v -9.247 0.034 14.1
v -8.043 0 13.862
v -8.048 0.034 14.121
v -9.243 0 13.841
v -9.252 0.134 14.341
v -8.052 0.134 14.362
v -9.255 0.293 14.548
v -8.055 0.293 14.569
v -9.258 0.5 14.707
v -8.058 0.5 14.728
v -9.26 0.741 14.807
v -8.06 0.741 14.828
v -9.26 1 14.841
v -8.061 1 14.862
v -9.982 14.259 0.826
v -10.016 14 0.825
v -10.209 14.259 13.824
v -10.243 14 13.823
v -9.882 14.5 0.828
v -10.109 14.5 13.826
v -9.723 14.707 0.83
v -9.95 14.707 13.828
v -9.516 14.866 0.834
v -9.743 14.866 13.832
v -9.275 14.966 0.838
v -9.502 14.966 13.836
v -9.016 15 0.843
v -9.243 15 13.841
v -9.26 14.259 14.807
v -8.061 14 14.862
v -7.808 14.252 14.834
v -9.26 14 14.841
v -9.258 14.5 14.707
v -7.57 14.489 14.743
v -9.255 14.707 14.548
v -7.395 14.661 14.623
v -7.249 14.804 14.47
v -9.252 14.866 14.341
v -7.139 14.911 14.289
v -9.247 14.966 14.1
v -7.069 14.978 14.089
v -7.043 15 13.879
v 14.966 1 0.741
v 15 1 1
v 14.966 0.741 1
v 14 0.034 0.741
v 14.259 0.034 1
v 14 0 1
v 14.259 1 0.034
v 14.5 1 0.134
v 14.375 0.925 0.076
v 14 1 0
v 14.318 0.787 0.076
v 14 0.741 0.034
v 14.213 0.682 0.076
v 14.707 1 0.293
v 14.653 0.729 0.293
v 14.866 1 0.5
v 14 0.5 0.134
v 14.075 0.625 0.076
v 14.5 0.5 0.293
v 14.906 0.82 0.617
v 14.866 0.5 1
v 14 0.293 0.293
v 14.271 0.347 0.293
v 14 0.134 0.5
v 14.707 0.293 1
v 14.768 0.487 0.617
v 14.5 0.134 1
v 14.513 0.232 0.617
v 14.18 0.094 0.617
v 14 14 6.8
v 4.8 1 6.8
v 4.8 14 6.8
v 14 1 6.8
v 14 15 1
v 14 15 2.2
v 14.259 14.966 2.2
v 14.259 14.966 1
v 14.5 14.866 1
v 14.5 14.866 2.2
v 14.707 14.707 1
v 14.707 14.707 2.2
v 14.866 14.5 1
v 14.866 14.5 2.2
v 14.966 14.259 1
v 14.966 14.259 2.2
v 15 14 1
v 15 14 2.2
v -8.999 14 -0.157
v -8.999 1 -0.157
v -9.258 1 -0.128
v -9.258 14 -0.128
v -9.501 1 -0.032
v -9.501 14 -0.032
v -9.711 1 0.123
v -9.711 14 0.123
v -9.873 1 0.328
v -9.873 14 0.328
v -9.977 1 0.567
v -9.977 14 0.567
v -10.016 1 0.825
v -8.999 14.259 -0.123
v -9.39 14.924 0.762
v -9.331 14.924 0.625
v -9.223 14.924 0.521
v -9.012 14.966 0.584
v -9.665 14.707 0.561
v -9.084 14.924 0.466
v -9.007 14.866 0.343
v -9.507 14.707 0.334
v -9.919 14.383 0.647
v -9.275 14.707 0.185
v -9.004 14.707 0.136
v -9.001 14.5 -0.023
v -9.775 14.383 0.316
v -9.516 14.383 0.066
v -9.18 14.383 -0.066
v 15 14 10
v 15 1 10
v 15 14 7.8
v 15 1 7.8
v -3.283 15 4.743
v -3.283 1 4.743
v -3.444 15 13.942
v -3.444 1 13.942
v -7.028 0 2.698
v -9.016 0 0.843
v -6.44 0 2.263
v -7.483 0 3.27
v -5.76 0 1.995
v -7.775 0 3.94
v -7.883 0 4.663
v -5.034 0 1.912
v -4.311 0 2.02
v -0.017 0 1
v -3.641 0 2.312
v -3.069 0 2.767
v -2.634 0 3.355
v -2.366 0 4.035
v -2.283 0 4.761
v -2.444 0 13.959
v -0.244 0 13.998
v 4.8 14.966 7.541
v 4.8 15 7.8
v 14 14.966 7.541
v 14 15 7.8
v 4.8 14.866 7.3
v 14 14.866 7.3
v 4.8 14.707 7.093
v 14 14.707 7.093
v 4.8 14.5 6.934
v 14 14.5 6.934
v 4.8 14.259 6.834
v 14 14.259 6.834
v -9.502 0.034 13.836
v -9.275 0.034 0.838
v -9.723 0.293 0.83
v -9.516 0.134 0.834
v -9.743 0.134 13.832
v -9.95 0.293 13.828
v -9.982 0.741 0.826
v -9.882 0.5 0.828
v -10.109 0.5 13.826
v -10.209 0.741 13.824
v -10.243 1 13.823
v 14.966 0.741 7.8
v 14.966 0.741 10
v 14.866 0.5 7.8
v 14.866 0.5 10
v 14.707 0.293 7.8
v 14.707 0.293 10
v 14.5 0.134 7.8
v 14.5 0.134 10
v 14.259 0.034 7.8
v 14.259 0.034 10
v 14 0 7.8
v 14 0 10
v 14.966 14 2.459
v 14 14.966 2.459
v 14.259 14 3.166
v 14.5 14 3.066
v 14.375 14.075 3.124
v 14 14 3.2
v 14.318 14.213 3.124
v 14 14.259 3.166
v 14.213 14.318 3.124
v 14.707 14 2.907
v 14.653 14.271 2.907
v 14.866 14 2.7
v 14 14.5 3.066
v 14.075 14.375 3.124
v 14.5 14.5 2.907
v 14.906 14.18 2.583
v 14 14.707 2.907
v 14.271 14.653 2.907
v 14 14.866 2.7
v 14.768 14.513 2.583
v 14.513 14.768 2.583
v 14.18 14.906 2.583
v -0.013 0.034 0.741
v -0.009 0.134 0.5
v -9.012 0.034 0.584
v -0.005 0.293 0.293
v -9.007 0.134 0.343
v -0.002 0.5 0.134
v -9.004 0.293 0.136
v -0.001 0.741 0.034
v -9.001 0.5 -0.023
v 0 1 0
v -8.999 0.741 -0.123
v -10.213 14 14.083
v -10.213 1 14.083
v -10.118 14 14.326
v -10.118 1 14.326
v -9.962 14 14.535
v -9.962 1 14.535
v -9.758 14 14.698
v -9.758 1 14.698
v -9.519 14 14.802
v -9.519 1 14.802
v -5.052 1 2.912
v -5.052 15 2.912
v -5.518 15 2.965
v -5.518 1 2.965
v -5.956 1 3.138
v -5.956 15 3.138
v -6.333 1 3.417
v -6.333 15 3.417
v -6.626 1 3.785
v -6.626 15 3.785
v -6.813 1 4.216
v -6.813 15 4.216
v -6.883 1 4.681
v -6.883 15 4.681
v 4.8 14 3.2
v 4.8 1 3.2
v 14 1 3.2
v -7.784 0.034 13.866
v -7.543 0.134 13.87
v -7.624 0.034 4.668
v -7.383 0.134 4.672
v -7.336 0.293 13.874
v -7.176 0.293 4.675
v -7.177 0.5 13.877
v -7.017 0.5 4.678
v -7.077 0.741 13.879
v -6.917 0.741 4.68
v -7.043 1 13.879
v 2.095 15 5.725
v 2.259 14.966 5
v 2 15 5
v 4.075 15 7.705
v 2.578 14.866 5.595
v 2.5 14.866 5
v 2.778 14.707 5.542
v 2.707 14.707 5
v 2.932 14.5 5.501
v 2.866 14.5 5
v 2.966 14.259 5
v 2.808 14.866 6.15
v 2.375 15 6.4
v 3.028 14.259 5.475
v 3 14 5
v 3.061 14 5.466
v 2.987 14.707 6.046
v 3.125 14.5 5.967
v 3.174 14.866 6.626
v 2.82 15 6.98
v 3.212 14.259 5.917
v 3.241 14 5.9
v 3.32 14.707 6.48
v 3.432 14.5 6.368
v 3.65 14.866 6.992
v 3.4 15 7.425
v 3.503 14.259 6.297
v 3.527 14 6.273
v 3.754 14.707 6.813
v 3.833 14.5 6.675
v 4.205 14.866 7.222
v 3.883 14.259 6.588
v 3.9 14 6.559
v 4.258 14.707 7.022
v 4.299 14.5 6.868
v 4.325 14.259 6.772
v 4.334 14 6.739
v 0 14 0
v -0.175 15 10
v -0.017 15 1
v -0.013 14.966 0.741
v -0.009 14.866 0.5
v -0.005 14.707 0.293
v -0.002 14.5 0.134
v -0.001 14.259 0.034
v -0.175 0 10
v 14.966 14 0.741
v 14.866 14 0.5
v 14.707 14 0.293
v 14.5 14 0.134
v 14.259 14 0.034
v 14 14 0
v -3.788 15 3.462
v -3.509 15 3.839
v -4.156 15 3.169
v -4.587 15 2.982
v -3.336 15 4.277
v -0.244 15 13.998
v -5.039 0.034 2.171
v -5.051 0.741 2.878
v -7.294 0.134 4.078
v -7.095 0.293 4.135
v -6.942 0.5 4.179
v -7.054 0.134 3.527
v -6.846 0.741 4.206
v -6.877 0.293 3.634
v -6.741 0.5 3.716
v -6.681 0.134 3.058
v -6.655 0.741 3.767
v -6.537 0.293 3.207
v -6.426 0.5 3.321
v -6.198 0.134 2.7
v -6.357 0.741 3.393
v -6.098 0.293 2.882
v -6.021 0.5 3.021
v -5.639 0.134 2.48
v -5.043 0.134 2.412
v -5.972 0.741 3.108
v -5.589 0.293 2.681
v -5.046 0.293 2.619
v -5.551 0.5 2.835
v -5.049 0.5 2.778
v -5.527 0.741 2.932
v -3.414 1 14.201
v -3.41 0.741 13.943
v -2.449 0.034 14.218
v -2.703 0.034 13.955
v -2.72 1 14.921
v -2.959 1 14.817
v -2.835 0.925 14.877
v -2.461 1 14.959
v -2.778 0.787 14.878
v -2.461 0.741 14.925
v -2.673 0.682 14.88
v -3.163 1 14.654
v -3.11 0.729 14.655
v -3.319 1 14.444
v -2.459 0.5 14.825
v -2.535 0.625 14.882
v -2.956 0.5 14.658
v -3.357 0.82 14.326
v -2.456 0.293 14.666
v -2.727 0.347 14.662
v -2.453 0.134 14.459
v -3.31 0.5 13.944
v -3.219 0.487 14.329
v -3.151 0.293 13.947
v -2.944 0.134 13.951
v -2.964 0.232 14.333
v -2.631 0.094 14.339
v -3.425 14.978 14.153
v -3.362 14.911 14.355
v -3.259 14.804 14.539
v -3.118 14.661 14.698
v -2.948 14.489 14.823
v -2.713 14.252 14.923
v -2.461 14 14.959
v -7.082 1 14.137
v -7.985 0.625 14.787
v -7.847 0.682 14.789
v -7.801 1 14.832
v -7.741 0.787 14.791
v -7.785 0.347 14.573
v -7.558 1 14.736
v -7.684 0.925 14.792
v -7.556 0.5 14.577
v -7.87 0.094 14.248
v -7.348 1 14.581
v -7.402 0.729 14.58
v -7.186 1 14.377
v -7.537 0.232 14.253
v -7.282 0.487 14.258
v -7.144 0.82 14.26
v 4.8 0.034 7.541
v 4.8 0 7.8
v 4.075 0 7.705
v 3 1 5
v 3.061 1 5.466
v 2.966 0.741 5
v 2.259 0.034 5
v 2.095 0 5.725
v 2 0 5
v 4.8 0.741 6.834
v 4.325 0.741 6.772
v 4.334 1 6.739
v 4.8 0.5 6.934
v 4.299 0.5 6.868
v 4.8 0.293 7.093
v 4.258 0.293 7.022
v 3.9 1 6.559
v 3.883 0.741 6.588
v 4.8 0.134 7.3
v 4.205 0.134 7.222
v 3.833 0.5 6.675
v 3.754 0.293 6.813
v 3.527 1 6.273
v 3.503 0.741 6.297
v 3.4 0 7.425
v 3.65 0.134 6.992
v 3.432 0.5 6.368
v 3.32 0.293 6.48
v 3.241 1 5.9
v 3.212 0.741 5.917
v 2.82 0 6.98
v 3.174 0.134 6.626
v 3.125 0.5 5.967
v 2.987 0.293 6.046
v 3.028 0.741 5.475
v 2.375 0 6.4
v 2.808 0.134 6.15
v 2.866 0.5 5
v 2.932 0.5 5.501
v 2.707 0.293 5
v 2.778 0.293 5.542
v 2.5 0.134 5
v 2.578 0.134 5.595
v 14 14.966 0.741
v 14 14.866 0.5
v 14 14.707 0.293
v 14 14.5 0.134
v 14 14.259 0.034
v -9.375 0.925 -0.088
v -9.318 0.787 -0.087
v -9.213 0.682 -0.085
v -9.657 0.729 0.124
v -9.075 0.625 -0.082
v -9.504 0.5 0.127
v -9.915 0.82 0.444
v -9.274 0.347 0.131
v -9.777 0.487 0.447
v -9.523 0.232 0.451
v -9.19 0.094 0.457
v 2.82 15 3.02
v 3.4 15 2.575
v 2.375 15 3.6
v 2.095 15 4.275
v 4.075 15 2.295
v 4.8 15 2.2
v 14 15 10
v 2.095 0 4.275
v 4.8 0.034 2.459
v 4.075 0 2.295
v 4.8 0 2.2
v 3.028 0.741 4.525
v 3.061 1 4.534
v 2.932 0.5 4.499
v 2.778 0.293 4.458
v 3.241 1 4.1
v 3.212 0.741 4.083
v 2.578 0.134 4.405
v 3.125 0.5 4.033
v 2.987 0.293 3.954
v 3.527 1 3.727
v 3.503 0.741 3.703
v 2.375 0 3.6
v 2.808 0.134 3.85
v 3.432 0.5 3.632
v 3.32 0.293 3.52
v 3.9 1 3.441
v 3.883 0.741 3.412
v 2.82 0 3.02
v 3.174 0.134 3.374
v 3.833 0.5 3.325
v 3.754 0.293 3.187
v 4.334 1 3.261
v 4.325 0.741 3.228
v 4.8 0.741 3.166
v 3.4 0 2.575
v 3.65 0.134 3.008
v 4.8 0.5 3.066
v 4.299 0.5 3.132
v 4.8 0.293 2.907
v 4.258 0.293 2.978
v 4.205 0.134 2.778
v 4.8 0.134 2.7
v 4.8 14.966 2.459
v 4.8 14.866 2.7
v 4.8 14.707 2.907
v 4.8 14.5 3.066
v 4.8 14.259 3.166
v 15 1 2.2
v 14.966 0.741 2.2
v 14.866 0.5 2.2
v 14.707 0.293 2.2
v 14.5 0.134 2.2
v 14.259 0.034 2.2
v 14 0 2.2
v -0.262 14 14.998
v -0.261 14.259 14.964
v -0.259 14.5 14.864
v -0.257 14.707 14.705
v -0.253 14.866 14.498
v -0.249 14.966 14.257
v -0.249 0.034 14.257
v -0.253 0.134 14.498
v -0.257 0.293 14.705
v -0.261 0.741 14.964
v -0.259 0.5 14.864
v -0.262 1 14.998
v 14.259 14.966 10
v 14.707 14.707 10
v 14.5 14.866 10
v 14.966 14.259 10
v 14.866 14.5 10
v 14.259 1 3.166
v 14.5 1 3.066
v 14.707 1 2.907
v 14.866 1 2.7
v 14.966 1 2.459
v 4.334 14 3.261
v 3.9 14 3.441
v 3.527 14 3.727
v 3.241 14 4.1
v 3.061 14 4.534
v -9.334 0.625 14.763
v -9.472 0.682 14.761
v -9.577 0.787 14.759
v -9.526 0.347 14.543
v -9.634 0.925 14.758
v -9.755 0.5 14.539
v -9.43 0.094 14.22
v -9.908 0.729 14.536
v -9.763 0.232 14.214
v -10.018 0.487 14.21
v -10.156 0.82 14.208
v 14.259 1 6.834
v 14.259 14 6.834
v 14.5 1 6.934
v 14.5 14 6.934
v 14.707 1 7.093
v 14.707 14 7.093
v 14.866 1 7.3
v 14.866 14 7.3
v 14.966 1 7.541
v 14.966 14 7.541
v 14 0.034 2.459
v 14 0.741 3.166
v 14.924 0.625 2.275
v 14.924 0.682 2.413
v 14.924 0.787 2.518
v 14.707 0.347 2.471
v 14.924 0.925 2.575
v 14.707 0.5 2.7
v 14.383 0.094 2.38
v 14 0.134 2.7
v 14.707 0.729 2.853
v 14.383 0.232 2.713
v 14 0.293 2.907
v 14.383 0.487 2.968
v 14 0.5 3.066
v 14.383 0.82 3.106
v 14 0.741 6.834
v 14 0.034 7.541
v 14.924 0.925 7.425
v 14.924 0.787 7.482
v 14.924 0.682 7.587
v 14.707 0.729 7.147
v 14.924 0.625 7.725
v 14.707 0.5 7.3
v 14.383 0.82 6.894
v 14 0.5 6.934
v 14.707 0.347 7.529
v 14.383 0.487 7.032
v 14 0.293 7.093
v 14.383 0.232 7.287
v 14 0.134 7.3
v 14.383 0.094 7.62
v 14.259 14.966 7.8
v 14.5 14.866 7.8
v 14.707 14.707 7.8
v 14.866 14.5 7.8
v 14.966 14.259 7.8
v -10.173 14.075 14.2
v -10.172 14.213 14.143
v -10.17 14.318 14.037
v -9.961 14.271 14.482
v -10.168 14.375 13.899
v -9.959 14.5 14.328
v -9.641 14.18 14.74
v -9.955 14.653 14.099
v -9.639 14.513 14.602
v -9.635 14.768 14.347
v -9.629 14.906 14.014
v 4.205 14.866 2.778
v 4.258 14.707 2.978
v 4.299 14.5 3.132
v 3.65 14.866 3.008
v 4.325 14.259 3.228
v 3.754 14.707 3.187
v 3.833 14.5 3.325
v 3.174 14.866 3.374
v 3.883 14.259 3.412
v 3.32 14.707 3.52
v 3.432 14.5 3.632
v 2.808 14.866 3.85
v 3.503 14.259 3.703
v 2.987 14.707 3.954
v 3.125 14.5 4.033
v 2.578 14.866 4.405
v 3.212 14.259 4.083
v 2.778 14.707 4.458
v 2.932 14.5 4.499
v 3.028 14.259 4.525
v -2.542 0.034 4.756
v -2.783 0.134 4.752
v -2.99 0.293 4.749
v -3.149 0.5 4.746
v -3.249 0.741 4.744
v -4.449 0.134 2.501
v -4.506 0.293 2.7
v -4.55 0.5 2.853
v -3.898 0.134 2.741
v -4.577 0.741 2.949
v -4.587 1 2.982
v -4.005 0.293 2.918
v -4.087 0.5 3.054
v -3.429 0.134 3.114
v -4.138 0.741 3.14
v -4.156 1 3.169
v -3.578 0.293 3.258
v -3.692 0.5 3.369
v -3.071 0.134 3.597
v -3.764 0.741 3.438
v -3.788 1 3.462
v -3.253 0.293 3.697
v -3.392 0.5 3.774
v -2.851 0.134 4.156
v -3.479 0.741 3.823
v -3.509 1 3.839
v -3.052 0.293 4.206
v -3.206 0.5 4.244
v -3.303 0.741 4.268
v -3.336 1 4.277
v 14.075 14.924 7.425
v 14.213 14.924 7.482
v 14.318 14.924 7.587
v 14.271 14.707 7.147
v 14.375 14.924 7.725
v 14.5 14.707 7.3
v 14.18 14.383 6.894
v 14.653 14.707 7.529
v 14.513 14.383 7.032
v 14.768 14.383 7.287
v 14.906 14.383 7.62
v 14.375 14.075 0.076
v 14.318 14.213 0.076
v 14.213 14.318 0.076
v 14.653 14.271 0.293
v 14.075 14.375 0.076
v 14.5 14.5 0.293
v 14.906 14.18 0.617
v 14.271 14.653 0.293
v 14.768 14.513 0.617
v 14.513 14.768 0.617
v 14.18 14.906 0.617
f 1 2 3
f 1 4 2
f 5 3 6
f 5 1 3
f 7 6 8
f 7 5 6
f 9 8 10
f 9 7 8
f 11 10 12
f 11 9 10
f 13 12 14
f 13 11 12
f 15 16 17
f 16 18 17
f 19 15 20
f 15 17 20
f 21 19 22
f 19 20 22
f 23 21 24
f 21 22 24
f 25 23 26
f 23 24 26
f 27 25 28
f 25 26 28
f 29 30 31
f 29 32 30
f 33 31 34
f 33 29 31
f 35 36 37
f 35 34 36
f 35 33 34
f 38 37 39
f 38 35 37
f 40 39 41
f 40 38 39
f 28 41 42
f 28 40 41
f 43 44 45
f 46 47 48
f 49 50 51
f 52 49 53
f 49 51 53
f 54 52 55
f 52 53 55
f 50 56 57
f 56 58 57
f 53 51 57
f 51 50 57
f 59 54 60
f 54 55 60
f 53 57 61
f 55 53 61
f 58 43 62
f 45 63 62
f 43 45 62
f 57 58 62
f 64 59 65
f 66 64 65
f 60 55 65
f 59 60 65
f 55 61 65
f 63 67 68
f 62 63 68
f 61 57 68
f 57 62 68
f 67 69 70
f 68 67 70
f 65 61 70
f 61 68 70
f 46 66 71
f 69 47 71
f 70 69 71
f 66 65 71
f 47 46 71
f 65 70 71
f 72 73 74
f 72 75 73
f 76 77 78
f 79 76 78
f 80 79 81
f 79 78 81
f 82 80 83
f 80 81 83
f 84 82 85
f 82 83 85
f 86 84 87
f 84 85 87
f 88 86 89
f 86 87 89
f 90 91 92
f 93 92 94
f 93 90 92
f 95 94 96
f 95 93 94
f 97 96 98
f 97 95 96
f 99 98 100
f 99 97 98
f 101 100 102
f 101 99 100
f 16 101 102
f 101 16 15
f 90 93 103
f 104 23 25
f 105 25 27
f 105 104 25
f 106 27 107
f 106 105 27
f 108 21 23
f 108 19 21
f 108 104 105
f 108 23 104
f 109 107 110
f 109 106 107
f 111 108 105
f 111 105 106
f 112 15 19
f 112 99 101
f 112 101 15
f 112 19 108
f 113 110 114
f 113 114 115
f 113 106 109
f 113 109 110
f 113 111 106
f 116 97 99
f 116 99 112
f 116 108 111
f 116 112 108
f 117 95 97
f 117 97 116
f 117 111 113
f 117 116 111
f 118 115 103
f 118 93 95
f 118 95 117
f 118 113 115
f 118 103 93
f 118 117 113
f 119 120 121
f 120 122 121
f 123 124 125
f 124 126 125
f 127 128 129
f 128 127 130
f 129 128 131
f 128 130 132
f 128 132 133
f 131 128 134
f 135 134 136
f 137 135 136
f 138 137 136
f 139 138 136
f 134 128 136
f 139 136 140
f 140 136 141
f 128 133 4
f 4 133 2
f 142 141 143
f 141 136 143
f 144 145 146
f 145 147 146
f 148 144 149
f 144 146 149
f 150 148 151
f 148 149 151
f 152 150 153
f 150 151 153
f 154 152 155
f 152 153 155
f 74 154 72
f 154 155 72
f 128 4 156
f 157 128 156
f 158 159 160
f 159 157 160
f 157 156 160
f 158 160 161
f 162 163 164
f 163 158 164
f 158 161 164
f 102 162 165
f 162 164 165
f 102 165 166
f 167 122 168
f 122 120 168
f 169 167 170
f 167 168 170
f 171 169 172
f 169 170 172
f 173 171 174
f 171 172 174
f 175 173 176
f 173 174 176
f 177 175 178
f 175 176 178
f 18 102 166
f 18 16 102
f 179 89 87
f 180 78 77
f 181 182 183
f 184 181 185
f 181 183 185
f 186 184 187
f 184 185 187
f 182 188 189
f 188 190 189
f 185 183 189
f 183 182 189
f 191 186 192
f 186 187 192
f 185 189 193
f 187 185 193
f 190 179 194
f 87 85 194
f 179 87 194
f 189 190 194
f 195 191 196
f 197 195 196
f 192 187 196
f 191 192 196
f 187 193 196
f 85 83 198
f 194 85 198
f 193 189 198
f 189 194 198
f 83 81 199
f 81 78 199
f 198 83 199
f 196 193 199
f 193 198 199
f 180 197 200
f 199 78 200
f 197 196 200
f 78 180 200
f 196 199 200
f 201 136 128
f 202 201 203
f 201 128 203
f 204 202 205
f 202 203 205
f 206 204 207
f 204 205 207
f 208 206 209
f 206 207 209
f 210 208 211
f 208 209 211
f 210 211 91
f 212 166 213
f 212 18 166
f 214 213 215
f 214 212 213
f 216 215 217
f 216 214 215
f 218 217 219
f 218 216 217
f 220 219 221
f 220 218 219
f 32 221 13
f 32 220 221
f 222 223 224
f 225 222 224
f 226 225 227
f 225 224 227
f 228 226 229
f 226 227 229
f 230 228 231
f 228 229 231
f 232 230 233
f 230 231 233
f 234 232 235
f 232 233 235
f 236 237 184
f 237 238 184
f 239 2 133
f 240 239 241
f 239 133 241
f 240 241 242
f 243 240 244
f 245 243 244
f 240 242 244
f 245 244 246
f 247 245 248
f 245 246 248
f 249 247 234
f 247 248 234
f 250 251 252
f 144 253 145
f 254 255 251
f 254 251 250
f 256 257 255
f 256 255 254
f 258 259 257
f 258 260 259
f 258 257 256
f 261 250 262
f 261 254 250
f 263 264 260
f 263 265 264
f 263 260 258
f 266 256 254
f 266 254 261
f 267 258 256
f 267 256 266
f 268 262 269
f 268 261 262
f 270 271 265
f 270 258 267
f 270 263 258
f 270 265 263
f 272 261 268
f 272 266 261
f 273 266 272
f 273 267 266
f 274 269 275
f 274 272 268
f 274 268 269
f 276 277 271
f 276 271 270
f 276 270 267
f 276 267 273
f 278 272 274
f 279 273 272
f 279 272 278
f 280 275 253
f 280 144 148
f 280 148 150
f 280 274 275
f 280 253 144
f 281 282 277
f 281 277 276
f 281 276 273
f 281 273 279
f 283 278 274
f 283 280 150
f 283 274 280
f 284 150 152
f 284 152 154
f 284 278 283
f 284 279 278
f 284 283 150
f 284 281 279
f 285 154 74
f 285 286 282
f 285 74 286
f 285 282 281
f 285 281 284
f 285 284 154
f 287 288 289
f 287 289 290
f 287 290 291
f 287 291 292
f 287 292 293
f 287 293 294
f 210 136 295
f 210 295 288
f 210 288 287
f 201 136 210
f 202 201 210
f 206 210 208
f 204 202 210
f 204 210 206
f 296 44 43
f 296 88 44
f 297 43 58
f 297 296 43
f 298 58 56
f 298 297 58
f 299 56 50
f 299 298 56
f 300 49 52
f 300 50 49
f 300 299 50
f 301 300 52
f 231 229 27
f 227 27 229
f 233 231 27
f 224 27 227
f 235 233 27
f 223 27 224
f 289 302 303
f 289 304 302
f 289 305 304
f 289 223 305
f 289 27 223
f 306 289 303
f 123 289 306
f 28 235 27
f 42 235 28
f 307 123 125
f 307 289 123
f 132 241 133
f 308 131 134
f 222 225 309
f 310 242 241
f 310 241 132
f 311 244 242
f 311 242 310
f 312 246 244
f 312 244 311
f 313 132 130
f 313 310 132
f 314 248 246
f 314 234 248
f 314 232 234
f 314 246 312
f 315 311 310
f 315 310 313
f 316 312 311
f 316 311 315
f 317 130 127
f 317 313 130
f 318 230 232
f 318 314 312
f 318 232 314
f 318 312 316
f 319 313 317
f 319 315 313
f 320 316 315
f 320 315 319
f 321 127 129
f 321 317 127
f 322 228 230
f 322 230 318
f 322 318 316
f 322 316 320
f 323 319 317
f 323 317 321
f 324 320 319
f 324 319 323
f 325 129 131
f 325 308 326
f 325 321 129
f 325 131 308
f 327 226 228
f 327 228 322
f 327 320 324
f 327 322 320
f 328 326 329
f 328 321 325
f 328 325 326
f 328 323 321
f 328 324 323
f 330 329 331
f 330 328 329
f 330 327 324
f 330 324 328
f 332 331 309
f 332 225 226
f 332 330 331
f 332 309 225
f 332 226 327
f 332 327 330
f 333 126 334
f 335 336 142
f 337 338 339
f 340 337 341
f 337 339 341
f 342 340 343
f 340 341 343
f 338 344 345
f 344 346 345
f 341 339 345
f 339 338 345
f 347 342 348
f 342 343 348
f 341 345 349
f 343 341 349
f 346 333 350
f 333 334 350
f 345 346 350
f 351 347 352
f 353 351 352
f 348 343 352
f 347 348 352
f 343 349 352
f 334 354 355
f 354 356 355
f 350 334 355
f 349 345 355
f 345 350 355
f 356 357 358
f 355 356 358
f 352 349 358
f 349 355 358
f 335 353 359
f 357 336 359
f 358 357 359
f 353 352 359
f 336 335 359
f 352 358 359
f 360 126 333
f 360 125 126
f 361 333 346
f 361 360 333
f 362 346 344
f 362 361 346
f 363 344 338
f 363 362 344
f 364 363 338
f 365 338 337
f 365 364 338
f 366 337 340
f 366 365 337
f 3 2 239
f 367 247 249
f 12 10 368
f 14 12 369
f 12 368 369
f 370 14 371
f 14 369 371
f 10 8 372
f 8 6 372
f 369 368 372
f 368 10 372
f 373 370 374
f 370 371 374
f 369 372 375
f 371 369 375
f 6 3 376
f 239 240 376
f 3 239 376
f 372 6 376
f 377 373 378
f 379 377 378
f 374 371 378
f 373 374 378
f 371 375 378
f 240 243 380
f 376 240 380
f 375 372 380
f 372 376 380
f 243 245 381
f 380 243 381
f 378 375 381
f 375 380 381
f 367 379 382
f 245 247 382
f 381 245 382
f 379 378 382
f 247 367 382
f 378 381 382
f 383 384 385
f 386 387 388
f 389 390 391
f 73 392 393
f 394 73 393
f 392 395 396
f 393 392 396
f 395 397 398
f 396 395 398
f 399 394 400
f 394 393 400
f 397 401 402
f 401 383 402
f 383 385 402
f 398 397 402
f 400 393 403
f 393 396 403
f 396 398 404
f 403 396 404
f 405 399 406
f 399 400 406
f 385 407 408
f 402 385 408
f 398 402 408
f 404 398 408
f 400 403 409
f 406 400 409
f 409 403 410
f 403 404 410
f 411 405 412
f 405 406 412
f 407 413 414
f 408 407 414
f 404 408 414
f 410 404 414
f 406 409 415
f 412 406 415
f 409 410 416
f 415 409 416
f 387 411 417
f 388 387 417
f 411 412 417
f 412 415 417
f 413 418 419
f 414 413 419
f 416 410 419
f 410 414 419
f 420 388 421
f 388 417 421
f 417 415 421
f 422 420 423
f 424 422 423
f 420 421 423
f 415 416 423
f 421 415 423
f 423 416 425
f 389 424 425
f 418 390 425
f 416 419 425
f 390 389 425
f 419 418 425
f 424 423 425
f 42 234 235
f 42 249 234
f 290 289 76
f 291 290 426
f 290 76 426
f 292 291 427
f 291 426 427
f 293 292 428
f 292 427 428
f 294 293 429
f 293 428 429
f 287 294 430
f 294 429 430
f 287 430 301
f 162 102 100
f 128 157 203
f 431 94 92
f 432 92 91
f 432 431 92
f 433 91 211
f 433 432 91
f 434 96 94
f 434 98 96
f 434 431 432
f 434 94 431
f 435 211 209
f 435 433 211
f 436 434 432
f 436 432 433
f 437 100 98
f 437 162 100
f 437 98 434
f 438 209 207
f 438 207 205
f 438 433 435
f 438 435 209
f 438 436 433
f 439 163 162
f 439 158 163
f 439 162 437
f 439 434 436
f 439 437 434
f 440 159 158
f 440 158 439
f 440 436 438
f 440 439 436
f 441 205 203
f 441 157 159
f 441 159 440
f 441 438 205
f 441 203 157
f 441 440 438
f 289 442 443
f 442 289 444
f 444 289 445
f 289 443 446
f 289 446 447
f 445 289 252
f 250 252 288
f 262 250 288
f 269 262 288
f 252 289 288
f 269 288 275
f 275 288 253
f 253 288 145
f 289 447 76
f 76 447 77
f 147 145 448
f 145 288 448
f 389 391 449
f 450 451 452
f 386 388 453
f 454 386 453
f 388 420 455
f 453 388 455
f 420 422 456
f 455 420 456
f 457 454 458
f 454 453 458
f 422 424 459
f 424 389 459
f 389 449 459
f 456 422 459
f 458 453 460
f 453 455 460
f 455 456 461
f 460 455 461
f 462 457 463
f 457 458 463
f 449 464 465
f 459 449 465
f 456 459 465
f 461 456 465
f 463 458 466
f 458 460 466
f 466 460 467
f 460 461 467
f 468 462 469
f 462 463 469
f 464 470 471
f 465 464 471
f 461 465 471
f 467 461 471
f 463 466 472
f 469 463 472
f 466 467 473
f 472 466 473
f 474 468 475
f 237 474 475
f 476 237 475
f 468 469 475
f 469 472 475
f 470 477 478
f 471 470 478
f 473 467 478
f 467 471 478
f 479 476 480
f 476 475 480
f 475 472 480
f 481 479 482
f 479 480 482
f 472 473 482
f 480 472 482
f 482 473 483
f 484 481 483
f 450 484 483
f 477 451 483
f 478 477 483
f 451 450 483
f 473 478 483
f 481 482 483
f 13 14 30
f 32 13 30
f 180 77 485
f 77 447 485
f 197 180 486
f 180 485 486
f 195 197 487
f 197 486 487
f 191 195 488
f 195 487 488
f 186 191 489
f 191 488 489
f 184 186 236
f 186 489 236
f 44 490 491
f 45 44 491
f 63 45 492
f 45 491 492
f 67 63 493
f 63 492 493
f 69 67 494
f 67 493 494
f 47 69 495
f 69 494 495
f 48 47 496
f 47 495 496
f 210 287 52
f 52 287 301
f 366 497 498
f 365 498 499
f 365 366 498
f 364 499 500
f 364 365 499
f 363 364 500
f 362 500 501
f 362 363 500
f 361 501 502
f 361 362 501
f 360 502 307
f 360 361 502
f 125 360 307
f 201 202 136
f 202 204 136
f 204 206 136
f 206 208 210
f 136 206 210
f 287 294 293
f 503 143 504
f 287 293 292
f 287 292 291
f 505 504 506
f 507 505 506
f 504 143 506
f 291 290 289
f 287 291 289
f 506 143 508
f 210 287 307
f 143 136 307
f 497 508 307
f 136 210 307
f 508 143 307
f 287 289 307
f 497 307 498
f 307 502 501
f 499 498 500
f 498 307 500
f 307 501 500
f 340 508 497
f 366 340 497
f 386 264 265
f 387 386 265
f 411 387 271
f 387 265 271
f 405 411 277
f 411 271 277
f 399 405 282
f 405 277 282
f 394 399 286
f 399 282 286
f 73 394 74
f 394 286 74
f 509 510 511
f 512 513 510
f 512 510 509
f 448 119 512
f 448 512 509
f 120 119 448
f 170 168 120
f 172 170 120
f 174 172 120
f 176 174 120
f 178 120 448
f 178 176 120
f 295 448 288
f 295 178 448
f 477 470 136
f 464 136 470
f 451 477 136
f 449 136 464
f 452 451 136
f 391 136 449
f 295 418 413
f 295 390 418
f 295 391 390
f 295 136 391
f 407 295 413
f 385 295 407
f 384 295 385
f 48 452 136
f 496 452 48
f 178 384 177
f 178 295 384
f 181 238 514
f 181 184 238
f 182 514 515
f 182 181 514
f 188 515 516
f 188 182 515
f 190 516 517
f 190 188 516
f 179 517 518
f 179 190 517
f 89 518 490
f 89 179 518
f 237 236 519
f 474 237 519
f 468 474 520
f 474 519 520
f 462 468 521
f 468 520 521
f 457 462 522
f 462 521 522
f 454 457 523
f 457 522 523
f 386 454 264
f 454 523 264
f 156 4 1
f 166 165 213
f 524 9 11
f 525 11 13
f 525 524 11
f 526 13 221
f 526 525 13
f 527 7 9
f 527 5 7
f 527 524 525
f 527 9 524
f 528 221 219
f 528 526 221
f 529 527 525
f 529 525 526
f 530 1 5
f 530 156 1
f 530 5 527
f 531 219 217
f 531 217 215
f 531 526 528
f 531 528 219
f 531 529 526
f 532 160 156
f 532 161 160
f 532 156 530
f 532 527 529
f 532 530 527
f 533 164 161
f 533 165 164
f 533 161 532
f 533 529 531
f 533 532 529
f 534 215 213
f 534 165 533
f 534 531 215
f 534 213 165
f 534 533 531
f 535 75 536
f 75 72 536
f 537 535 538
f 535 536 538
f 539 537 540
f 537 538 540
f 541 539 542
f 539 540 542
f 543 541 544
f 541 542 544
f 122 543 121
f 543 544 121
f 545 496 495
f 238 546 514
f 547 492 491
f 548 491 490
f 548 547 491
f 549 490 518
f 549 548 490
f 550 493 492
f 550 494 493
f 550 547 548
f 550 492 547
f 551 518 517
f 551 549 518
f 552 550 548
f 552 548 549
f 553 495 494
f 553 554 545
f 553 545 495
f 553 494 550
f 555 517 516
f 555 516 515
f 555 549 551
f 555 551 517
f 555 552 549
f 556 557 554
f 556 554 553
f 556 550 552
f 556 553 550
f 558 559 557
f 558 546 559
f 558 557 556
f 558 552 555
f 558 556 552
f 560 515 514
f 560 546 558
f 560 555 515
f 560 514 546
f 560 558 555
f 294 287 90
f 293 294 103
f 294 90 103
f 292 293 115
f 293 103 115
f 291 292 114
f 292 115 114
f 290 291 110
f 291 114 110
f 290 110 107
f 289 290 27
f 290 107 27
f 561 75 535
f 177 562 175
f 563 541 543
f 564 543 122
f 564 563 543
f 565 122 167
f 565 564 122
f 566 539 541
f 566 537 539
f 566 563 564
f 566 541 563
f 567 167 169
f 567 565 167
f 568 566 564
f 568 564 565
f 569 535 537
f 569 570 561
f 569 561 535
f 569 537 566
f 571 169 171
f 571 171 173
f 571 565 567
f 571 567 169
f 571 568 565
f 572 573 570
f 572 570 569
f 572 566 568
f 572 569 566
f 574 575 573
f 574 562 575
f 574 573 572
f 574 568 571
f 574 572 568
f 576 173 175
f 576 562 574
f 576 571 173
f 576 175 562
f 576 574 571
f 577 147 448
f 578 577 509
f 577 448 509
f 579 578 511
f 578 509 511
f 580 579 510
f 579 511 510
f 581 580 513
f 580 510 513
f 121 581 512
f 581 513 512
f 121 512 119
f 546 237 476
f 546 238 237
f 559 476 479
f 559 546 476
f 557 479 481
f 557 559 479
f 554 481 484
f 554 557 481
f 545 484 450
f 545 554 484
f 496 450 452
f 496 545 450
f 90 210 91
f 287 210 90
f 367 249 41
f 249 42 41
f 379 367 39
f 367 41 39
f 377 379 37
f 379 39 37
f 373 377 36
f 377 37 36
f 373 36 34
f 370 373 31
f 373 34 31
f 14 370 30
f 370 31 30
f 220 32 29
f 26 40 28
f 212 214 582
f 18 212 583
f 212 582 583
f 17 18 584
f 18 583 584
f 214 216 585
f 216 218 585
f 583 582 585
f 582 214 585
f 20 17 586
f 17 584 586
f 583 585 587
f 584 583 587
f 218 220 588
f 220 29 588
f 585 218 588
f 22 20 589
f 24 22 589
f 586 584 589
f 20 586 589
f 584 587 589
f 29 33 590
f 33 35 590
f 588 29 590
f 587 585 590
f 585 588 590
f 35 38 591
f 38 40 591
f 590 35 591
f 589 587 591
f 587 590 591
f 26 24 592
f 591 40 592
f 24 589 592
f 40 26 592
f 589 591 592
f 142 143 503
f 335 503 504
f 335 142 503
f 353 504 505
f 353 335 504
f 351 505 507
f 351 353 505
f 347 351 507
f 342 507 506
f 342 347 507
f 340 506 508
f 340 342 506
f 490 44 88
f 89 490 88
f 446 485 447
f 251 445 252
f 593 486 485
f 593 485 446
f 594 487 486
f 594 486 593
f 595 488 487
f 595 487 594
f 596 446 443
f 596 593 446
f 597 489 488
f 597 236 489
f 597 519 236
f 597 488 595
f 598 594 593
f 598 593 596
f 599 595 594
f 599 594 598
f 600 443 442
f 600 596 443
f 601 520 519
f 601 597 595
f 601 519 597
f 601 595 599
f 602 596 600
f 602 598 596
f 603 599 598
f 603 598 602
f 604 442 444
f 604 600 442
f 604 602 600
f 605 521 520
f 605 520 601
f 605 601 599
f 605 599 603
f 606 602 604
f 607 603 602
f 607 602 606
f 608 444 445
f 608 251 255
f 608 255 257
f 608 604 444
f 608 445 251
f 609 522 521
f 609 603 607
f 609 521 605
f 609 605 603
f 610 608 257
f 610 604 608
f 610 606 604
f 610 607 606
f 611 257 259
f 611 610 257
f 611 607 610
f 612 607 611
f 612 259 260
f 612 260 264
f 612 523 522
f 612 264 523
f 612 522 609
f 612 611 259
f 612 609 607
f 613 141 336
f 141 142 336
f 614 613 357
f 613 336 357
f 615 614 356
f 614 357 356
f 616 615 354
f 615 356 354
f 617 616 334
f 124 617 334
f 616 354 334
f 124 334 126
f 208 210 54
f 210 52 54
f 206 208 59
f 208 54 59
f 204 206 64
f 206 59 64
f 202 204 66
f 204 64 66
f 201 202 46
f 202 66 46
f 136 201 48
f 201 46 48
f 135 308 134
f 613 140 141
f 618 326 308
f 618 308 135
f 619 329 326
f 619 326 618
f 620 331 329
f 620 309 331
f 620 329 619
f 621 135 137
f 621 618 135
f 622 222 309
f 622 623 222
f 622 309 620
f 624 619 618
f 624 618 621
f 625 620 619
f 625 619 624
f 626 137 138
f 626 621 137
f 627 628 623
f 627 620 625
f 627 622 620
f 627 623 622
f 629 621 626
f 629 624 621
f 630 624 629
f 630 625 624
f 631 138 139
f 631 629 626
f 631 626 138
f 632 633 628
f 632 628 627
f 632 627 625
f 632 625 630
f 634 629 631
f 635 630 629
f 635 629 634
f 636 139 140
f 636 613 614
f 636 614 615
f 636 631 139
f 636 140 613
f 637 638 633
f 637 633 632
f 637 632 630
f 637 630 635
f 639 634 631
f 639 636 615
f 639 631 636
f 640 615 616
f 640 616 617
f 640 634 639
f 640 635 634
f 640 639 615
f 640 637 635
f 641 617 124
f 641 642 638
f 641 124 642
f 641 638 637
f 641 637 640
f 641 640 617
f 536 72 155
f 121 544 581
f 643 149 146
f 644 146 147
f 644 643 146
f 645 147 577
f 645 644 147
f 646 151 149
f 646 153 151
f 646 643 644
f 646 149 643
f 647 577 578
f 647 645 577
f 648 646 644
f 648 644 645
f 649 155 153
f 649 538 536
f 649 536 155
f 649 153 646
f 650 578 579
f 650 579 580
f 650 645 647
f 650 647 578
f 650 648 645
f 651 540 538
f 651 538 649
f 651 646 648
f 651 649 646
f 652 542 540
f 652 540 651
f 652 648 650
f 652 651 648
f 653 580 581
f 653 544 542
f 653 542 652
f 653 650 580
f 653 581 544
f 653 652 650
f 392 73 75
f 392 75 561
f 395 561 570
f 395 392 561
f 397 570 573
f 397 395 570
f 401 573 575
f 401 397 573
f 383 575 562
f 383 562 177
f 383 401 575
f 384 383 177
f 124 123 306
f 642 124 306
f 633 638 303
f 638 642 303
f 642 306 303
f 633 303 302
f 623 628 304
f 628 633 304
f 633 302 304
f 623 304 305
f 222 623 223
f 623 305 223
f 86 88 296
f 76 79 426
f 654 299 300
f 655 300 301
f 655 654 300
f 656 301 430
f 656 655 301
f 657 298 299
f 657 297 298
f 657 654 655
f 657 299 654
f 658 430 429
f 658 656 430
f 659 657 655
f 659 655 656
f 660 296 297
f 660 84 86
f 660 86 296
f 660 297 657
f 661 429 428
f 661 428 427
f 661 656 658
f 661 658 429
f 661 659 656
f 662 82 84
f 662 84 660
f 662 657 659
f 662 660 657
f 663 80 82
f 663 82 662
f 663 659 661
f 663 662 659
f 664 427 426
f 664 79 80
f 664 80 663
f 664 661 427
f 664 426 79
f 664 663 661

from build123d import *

# Parameters (mm, degrees)
F0_W     = 15
F0_H     = 15
F1_DEPTH = 10
F2_W     = 15
F2_H     = 3.6
F3_DEPTH = 12
F4_R     = 1.79999
F5_COUNT = 2
F5_ANGLE = 91
F7_DEPTH = 15
F8_R     = 1
F8_2_R   = 1


# Not quite as in the source:
# - a fillet or chamfer is up to 0.001 mm smaller than in the source, because OpenCascade refuses the exact size


with BuildPart() as f1:
    # F0 (on Top) → F1 (new body)
    with BuildSketch(Plane.XY):
        with Locations((7.5, 7.5)):
            Rectangle(F0_W, F0_H)
    extrude(amount=F1_DEPTH)

    # F2 (on face) → F3 (cut)
    with BuildSketch(Plane.YZ.offset(15)):
        with Locations((7.5, 5)):
            Rectangle(F2_W, F2_H)
    extrude(amount=-F3_DEPTH, mode=Mode.SUBTRACT)

    # F4 (radius 1.8 in the source; OpenCascade refuses exactly that, so slightly less here)
    f4_edges = [f1.edges().sort_by_distance(p)[0] for p in [
        (3, 7.5, 3.2),
        (3, 7.5, 6.8),
    ]]
    fillet(f4_edges, radius=F4_R)


with BuildPart() as f5_1:
    # F5: instance of F1
    add(f1.part.rotate(Axis((0, 7.5, 0), (0, -1, 0)), 1 * F5_ANGLE / (F5_COUNT - 1)))

    # F8#2
    f8_2_edges = [f5_1.edges().sort_by_distance(p)[0] for p in [
        (-10.12937, 0, 7.324334),
        (-6.971743, 0, 9.779811),
        (-8.660507, 0, 14.851115),
        (-7.06075, 7.5, 14.879039),
        (-8.660507, 15, 14.851115),
        (-10.260263, 7.5, 14.823191),
        (-9.998477, 7.5, -0.174524),
        (-10.12937, 15, 7.324334),
        (-3.461299, 7.5, 14.941868),
        (-4.999238, 0, -0.087262),
        (-4.999238, 15, -0.087262),
        (-1.861542, 0, 14.969792),
        (-1.861542, 15, 14.969792),
        (-6.333398, 0, 3.417192),
        (-5.051596, 0, 2.912281),
        (-3.788195, 0, 3.461619),
        (-3.372291, 0, 9.842639),
    ]]
    fillet(f8_2_edges, radius=F8_2_R)


with BuildPart() as f1_1:
    add(f1.part)

    # F6 (on face) → F7 (join, through all)
    with BuildSketch(Plane.XZ):
        Polygon((0, 0), (0, 10), (-0.1745506493, 10), align=None)
    extrude(amount=-F7_DEPTH)

    # F8
    f8_edges = [f1_1.edges().sort_by_distance(p)[0] for p in [
        (9.899995, 0, 6.8),
        (15, 7.5, 6.8),
        (15, 15, 1.6),
        (15, 0, 1.6),
        (15, 7.5, 3.2),
        (9.899995, 15, 3.2),
        (15, 7.5, 0),
        (7.5, 0, 0),
        (7.5, 15, 0),
        (15, 0, 8.4),
        (15, 15, 8.4),
        (9.899995, 15, 6.8),
        (3.527205, 15, 3.727205),
        (3, 15, 5),
        (3.527205, 15, 6.272795),
        (3.527205, 0, 6.272795),
        (9.899995, 0, 3.2),
        (3, 0, 5),
        (3.527205, 0, 3.727205),
    ]]
    fillet(f8_edges, radius=F8_R)


solid = Compound([f5_1.part, f1_1.part])
